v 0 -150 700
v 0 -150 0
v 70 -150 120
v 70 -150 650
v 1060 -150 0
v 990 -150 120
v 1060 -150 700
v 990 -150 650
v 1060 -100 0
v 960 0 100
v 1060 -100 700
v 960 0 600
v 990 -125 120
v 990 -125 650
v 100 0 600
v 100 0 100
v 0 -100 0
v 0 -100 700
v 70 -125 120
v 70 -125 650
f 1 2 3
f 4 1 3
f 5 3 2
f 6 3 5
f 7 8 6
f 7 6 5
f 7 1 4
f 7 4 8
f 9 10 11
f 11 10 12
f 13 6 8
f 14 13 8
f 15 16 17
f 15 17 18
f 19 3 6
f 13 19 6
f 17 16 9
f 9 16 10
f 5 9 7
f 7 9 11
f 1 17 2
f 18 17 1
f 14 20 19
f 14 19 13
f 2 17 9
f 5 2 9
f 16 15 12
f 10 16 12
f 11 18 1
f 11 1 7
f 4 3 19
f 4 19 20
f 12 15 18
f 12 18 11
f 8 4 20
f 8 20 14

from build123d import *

# Parameters (mm, degrees)
F0_W     = 1060
F0_H     = 700
F1_DEPTH = 150
F2_SIZE  = 100
F3_W     = 920
F3_H     = 530
F4_DEPTH = 25


with BuildPart() as f1:
    # F0 (on Front) → F1 (new body)
    with BuildSketch(Plane.XZ):
        with Locations((530, 350)):
            Rectangle(F0_W, F0_H)
    extrude(amount=F1_DEPTH)

    # F2
    f2_edges = [f1.edges().sort_by_distance(p)[0] for p in [
        (1060, 0, 350),
        (530, 0, 700),
        (0, 0, 350),
        (530, 0, 0),
    ]]
    chamfer(f2_edges, length=F2_SIZE)

    # F3 (on face) → F4 (cut)
    with BuildSketch(Plane.XZ.offset(150)):
        with Locations((530, 385)):
            Rectangle(F3_W, F3_H)
    extrude(amount=-F4_DEPTH, mode=Mode.SUBTRACT)


solid = f1.part
